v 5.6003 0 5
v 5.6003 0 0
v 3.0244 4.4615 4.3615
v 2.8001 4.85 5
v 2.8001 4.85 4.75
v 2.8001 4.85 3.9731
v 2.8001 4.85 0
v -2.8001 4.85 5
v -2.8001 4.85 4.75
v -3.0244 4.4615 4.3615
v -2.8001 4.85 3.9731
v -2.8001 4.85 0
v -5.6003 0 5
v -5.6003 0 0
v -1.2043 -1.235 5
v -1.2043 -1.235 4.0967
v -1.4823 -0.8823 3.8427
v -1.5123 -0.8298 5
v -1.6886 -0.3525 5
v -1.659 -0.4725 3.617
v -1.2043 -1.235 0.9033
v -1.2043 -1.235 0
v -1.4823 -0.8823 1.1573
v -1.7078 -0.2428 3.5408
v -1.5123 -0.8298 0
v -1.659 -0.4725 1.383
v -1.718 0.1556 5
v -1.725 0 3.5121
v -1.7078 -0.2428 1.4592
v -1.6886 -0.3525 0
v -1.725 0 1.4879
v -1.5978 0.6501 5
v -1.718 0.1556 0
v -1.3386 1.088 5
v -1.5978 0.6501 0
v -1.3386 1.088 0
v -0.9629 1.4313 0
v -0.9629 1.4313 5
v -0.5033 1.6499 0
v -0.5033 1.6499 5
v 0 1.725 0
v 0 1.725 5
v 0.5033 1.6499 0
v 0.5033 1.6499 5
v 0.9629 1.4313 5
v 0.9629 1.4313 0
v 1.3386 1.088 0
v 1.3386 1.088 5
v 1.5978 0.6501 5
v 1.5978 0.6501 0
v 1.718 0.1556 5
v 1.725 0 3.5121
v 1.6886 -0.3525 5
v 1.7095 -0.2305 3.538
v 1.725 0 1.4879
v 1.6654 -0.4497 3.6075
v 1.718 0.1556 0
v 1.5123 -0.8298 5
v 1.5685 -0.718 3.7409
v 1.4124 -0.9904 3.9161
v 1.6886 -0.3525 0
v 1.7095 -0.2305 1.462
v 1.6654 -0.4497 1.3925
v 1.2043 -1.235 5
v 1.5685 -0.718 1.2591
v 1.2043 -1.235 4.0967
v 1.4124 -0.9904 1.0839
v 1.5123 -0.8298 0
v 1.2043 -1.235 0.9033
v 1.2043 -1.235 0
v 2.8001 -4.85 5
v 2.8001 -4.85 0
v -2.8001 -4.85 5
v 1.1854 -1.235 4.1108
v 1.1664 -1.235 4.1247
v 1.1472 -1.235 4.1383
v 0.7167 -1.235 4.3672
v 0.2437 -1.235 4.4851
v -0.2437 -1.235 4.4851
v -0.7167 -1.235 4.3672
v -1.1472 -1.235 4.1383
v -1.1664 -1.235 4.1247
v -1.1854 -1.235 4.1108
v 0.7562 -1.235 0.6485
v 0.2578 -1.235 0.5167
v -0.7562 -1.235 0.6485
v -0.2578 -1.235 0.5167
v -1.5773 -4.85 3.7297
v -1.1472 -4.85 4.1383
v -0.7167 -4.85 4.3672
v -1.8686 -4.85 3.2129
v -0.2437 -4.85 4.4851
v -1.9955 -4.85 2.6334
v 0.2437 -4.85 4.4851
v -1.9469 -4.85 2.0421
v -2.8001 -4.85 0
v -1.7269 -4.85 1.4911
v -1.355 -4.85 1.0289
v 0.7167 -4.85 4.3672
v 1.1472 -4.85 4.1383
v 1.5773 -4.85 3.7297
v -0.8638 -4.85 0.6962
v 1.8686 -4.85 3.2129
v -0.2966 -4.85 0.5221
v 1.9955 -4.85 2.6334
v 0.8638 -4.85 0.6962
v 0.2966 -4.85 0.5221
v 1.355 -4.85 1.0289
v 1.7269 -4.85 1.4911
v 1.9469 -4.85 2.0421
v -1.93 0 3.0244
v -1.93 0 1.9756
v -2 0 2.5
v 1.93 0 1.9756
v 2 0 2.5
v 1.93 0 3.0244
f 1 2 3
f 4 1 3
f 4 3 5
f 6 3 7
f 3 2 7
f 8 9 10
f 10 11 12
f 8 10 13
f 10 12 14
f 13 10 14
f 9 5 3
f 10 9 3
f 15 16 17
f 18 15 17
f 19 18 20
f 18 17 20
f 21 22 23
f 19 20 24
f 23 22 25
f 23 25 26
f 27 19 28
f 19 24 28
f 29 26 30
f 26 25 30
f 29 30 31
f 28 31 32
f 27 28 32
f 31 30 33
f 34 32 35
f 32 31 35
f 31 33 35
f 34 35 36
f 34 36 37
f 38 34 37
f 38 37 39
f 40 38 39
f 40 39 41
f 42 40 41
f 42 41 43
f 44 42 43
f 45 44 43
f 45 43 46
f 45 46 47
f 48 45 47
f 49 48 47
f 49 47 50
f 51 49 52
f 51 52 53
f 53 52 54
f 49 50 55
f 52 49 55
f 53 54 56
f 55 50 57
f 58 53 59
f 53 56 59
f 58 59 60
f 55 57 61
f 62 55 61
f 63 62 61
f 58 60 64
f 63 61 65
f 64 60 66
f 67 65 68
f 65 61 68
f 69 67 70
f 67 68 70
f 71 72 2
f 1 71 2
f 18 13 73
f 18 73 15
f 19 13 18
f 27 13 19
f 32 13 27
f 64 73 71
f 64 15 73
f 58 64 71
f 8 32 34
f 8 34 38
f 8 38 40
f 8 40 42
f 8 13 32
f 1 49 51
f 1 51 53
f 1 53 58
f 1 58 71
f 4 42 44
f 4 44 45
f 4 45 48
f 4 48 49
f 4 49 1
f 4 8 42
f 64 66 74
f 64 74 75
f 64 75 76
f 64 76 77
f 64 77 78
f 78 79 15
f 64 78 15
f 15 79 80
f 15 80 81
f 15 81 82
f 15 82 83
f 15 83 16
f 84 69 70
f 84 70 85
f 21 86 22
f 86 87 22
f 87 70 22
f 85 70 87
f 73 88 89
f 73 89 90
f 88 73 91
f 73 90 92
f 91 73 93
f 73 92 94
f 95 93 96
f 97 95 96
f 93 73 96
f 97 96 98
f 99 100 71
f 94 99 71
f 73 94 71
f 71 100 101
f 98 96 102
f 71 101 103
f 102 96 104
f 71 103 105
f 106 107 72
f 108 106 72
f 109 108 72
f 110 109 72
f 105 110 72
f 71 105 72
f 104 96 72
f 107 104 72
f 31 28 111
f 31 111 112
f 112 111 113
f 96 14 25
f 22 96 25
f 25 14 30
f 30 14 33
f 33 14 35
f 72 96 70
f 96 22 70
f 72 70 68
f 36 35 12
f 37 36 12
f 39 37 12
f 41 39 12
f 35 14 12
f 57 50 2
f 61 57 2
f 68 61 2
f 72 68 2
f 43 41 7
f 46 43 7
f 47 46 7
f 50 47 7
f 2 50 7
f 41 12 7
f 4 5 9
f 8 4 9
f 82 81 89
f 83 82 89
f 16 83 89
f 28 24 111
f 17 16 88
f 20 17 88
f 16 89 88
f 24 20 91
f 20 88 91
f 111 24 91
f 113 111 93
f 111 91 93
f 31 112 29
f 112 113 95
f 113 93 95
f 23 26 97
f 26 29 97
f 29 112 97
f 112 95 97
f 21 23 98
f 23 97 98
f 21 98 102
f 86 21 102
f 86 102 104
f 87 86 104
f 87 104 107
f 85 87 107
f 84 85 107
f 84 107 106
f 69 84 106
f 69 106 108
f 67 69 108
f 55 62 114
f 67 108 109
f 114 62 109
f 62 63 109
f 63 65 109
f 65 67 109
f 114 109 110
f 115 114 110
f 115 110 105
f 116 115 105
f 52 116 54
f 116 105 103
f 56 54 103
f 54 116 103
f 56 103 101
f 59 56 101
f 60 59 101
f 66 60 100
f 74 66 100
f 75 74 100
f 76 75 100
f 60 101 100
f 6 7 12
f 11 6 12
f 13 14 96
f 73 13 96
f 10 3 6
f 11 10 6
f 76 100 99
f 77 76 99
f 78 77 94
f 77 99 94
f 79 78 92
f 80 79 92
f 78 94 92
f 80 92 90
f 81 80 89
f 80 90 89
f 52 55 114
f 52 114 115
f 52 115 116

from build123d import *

# Parameters (mm, degrees)
F1_DEPTH = 5
F3_DEPTH = 12.5
F5_DEPTH = 4.85


with BuildPart() as f1:
    # F0 (on Top) → F1 (new body)
    with BuildSketch(Plane.XY):
        Polygon((-2.800149, 4.85), (-5.600298, 0), (-2.800149, -4.85), (2.800149, -4.85), (5.600298, 0), (2.800149, 4.85), align=None)
        with BuildLine():
            ThreePointArc((-1.204326, -1.235), (0, 1.725), (1.204326, -1.235))
            Line((1.204326, -1.235), (-1.204326, -1.235))
        make_face(mode=Mode.SUBTRACT)
    extrude(amount=F1_DEPTH)

    # F2 (on Right) → F3 (cut, symmetric)
    with BuildSketch(Plane.YZ):
        Polygon((4.85, 3.973057), (4.85, 4.75), (4.461528, 4.361528), align=None)
    extrude(amount=F3_DEPTH, both=True, mode=Mode.SUBTRACT)

    # F4 (on face) → F5 (cut, through all)
    with BuildSketch(Plane.XZ.offset(4.85)):
        with BuildLine():
            ThreePointArc((1.147153, 4.138304), (0, 4.5), (-1.147153, 4.138304))
            ThreePointArc((-1.147153, 4.138304), (0, 0.5), (1.147153, 4.138304))
        make_face()
    extrude(amount=-F5_DEPTH, mode=Mode.SUBTRACT)


solid = f1.part
